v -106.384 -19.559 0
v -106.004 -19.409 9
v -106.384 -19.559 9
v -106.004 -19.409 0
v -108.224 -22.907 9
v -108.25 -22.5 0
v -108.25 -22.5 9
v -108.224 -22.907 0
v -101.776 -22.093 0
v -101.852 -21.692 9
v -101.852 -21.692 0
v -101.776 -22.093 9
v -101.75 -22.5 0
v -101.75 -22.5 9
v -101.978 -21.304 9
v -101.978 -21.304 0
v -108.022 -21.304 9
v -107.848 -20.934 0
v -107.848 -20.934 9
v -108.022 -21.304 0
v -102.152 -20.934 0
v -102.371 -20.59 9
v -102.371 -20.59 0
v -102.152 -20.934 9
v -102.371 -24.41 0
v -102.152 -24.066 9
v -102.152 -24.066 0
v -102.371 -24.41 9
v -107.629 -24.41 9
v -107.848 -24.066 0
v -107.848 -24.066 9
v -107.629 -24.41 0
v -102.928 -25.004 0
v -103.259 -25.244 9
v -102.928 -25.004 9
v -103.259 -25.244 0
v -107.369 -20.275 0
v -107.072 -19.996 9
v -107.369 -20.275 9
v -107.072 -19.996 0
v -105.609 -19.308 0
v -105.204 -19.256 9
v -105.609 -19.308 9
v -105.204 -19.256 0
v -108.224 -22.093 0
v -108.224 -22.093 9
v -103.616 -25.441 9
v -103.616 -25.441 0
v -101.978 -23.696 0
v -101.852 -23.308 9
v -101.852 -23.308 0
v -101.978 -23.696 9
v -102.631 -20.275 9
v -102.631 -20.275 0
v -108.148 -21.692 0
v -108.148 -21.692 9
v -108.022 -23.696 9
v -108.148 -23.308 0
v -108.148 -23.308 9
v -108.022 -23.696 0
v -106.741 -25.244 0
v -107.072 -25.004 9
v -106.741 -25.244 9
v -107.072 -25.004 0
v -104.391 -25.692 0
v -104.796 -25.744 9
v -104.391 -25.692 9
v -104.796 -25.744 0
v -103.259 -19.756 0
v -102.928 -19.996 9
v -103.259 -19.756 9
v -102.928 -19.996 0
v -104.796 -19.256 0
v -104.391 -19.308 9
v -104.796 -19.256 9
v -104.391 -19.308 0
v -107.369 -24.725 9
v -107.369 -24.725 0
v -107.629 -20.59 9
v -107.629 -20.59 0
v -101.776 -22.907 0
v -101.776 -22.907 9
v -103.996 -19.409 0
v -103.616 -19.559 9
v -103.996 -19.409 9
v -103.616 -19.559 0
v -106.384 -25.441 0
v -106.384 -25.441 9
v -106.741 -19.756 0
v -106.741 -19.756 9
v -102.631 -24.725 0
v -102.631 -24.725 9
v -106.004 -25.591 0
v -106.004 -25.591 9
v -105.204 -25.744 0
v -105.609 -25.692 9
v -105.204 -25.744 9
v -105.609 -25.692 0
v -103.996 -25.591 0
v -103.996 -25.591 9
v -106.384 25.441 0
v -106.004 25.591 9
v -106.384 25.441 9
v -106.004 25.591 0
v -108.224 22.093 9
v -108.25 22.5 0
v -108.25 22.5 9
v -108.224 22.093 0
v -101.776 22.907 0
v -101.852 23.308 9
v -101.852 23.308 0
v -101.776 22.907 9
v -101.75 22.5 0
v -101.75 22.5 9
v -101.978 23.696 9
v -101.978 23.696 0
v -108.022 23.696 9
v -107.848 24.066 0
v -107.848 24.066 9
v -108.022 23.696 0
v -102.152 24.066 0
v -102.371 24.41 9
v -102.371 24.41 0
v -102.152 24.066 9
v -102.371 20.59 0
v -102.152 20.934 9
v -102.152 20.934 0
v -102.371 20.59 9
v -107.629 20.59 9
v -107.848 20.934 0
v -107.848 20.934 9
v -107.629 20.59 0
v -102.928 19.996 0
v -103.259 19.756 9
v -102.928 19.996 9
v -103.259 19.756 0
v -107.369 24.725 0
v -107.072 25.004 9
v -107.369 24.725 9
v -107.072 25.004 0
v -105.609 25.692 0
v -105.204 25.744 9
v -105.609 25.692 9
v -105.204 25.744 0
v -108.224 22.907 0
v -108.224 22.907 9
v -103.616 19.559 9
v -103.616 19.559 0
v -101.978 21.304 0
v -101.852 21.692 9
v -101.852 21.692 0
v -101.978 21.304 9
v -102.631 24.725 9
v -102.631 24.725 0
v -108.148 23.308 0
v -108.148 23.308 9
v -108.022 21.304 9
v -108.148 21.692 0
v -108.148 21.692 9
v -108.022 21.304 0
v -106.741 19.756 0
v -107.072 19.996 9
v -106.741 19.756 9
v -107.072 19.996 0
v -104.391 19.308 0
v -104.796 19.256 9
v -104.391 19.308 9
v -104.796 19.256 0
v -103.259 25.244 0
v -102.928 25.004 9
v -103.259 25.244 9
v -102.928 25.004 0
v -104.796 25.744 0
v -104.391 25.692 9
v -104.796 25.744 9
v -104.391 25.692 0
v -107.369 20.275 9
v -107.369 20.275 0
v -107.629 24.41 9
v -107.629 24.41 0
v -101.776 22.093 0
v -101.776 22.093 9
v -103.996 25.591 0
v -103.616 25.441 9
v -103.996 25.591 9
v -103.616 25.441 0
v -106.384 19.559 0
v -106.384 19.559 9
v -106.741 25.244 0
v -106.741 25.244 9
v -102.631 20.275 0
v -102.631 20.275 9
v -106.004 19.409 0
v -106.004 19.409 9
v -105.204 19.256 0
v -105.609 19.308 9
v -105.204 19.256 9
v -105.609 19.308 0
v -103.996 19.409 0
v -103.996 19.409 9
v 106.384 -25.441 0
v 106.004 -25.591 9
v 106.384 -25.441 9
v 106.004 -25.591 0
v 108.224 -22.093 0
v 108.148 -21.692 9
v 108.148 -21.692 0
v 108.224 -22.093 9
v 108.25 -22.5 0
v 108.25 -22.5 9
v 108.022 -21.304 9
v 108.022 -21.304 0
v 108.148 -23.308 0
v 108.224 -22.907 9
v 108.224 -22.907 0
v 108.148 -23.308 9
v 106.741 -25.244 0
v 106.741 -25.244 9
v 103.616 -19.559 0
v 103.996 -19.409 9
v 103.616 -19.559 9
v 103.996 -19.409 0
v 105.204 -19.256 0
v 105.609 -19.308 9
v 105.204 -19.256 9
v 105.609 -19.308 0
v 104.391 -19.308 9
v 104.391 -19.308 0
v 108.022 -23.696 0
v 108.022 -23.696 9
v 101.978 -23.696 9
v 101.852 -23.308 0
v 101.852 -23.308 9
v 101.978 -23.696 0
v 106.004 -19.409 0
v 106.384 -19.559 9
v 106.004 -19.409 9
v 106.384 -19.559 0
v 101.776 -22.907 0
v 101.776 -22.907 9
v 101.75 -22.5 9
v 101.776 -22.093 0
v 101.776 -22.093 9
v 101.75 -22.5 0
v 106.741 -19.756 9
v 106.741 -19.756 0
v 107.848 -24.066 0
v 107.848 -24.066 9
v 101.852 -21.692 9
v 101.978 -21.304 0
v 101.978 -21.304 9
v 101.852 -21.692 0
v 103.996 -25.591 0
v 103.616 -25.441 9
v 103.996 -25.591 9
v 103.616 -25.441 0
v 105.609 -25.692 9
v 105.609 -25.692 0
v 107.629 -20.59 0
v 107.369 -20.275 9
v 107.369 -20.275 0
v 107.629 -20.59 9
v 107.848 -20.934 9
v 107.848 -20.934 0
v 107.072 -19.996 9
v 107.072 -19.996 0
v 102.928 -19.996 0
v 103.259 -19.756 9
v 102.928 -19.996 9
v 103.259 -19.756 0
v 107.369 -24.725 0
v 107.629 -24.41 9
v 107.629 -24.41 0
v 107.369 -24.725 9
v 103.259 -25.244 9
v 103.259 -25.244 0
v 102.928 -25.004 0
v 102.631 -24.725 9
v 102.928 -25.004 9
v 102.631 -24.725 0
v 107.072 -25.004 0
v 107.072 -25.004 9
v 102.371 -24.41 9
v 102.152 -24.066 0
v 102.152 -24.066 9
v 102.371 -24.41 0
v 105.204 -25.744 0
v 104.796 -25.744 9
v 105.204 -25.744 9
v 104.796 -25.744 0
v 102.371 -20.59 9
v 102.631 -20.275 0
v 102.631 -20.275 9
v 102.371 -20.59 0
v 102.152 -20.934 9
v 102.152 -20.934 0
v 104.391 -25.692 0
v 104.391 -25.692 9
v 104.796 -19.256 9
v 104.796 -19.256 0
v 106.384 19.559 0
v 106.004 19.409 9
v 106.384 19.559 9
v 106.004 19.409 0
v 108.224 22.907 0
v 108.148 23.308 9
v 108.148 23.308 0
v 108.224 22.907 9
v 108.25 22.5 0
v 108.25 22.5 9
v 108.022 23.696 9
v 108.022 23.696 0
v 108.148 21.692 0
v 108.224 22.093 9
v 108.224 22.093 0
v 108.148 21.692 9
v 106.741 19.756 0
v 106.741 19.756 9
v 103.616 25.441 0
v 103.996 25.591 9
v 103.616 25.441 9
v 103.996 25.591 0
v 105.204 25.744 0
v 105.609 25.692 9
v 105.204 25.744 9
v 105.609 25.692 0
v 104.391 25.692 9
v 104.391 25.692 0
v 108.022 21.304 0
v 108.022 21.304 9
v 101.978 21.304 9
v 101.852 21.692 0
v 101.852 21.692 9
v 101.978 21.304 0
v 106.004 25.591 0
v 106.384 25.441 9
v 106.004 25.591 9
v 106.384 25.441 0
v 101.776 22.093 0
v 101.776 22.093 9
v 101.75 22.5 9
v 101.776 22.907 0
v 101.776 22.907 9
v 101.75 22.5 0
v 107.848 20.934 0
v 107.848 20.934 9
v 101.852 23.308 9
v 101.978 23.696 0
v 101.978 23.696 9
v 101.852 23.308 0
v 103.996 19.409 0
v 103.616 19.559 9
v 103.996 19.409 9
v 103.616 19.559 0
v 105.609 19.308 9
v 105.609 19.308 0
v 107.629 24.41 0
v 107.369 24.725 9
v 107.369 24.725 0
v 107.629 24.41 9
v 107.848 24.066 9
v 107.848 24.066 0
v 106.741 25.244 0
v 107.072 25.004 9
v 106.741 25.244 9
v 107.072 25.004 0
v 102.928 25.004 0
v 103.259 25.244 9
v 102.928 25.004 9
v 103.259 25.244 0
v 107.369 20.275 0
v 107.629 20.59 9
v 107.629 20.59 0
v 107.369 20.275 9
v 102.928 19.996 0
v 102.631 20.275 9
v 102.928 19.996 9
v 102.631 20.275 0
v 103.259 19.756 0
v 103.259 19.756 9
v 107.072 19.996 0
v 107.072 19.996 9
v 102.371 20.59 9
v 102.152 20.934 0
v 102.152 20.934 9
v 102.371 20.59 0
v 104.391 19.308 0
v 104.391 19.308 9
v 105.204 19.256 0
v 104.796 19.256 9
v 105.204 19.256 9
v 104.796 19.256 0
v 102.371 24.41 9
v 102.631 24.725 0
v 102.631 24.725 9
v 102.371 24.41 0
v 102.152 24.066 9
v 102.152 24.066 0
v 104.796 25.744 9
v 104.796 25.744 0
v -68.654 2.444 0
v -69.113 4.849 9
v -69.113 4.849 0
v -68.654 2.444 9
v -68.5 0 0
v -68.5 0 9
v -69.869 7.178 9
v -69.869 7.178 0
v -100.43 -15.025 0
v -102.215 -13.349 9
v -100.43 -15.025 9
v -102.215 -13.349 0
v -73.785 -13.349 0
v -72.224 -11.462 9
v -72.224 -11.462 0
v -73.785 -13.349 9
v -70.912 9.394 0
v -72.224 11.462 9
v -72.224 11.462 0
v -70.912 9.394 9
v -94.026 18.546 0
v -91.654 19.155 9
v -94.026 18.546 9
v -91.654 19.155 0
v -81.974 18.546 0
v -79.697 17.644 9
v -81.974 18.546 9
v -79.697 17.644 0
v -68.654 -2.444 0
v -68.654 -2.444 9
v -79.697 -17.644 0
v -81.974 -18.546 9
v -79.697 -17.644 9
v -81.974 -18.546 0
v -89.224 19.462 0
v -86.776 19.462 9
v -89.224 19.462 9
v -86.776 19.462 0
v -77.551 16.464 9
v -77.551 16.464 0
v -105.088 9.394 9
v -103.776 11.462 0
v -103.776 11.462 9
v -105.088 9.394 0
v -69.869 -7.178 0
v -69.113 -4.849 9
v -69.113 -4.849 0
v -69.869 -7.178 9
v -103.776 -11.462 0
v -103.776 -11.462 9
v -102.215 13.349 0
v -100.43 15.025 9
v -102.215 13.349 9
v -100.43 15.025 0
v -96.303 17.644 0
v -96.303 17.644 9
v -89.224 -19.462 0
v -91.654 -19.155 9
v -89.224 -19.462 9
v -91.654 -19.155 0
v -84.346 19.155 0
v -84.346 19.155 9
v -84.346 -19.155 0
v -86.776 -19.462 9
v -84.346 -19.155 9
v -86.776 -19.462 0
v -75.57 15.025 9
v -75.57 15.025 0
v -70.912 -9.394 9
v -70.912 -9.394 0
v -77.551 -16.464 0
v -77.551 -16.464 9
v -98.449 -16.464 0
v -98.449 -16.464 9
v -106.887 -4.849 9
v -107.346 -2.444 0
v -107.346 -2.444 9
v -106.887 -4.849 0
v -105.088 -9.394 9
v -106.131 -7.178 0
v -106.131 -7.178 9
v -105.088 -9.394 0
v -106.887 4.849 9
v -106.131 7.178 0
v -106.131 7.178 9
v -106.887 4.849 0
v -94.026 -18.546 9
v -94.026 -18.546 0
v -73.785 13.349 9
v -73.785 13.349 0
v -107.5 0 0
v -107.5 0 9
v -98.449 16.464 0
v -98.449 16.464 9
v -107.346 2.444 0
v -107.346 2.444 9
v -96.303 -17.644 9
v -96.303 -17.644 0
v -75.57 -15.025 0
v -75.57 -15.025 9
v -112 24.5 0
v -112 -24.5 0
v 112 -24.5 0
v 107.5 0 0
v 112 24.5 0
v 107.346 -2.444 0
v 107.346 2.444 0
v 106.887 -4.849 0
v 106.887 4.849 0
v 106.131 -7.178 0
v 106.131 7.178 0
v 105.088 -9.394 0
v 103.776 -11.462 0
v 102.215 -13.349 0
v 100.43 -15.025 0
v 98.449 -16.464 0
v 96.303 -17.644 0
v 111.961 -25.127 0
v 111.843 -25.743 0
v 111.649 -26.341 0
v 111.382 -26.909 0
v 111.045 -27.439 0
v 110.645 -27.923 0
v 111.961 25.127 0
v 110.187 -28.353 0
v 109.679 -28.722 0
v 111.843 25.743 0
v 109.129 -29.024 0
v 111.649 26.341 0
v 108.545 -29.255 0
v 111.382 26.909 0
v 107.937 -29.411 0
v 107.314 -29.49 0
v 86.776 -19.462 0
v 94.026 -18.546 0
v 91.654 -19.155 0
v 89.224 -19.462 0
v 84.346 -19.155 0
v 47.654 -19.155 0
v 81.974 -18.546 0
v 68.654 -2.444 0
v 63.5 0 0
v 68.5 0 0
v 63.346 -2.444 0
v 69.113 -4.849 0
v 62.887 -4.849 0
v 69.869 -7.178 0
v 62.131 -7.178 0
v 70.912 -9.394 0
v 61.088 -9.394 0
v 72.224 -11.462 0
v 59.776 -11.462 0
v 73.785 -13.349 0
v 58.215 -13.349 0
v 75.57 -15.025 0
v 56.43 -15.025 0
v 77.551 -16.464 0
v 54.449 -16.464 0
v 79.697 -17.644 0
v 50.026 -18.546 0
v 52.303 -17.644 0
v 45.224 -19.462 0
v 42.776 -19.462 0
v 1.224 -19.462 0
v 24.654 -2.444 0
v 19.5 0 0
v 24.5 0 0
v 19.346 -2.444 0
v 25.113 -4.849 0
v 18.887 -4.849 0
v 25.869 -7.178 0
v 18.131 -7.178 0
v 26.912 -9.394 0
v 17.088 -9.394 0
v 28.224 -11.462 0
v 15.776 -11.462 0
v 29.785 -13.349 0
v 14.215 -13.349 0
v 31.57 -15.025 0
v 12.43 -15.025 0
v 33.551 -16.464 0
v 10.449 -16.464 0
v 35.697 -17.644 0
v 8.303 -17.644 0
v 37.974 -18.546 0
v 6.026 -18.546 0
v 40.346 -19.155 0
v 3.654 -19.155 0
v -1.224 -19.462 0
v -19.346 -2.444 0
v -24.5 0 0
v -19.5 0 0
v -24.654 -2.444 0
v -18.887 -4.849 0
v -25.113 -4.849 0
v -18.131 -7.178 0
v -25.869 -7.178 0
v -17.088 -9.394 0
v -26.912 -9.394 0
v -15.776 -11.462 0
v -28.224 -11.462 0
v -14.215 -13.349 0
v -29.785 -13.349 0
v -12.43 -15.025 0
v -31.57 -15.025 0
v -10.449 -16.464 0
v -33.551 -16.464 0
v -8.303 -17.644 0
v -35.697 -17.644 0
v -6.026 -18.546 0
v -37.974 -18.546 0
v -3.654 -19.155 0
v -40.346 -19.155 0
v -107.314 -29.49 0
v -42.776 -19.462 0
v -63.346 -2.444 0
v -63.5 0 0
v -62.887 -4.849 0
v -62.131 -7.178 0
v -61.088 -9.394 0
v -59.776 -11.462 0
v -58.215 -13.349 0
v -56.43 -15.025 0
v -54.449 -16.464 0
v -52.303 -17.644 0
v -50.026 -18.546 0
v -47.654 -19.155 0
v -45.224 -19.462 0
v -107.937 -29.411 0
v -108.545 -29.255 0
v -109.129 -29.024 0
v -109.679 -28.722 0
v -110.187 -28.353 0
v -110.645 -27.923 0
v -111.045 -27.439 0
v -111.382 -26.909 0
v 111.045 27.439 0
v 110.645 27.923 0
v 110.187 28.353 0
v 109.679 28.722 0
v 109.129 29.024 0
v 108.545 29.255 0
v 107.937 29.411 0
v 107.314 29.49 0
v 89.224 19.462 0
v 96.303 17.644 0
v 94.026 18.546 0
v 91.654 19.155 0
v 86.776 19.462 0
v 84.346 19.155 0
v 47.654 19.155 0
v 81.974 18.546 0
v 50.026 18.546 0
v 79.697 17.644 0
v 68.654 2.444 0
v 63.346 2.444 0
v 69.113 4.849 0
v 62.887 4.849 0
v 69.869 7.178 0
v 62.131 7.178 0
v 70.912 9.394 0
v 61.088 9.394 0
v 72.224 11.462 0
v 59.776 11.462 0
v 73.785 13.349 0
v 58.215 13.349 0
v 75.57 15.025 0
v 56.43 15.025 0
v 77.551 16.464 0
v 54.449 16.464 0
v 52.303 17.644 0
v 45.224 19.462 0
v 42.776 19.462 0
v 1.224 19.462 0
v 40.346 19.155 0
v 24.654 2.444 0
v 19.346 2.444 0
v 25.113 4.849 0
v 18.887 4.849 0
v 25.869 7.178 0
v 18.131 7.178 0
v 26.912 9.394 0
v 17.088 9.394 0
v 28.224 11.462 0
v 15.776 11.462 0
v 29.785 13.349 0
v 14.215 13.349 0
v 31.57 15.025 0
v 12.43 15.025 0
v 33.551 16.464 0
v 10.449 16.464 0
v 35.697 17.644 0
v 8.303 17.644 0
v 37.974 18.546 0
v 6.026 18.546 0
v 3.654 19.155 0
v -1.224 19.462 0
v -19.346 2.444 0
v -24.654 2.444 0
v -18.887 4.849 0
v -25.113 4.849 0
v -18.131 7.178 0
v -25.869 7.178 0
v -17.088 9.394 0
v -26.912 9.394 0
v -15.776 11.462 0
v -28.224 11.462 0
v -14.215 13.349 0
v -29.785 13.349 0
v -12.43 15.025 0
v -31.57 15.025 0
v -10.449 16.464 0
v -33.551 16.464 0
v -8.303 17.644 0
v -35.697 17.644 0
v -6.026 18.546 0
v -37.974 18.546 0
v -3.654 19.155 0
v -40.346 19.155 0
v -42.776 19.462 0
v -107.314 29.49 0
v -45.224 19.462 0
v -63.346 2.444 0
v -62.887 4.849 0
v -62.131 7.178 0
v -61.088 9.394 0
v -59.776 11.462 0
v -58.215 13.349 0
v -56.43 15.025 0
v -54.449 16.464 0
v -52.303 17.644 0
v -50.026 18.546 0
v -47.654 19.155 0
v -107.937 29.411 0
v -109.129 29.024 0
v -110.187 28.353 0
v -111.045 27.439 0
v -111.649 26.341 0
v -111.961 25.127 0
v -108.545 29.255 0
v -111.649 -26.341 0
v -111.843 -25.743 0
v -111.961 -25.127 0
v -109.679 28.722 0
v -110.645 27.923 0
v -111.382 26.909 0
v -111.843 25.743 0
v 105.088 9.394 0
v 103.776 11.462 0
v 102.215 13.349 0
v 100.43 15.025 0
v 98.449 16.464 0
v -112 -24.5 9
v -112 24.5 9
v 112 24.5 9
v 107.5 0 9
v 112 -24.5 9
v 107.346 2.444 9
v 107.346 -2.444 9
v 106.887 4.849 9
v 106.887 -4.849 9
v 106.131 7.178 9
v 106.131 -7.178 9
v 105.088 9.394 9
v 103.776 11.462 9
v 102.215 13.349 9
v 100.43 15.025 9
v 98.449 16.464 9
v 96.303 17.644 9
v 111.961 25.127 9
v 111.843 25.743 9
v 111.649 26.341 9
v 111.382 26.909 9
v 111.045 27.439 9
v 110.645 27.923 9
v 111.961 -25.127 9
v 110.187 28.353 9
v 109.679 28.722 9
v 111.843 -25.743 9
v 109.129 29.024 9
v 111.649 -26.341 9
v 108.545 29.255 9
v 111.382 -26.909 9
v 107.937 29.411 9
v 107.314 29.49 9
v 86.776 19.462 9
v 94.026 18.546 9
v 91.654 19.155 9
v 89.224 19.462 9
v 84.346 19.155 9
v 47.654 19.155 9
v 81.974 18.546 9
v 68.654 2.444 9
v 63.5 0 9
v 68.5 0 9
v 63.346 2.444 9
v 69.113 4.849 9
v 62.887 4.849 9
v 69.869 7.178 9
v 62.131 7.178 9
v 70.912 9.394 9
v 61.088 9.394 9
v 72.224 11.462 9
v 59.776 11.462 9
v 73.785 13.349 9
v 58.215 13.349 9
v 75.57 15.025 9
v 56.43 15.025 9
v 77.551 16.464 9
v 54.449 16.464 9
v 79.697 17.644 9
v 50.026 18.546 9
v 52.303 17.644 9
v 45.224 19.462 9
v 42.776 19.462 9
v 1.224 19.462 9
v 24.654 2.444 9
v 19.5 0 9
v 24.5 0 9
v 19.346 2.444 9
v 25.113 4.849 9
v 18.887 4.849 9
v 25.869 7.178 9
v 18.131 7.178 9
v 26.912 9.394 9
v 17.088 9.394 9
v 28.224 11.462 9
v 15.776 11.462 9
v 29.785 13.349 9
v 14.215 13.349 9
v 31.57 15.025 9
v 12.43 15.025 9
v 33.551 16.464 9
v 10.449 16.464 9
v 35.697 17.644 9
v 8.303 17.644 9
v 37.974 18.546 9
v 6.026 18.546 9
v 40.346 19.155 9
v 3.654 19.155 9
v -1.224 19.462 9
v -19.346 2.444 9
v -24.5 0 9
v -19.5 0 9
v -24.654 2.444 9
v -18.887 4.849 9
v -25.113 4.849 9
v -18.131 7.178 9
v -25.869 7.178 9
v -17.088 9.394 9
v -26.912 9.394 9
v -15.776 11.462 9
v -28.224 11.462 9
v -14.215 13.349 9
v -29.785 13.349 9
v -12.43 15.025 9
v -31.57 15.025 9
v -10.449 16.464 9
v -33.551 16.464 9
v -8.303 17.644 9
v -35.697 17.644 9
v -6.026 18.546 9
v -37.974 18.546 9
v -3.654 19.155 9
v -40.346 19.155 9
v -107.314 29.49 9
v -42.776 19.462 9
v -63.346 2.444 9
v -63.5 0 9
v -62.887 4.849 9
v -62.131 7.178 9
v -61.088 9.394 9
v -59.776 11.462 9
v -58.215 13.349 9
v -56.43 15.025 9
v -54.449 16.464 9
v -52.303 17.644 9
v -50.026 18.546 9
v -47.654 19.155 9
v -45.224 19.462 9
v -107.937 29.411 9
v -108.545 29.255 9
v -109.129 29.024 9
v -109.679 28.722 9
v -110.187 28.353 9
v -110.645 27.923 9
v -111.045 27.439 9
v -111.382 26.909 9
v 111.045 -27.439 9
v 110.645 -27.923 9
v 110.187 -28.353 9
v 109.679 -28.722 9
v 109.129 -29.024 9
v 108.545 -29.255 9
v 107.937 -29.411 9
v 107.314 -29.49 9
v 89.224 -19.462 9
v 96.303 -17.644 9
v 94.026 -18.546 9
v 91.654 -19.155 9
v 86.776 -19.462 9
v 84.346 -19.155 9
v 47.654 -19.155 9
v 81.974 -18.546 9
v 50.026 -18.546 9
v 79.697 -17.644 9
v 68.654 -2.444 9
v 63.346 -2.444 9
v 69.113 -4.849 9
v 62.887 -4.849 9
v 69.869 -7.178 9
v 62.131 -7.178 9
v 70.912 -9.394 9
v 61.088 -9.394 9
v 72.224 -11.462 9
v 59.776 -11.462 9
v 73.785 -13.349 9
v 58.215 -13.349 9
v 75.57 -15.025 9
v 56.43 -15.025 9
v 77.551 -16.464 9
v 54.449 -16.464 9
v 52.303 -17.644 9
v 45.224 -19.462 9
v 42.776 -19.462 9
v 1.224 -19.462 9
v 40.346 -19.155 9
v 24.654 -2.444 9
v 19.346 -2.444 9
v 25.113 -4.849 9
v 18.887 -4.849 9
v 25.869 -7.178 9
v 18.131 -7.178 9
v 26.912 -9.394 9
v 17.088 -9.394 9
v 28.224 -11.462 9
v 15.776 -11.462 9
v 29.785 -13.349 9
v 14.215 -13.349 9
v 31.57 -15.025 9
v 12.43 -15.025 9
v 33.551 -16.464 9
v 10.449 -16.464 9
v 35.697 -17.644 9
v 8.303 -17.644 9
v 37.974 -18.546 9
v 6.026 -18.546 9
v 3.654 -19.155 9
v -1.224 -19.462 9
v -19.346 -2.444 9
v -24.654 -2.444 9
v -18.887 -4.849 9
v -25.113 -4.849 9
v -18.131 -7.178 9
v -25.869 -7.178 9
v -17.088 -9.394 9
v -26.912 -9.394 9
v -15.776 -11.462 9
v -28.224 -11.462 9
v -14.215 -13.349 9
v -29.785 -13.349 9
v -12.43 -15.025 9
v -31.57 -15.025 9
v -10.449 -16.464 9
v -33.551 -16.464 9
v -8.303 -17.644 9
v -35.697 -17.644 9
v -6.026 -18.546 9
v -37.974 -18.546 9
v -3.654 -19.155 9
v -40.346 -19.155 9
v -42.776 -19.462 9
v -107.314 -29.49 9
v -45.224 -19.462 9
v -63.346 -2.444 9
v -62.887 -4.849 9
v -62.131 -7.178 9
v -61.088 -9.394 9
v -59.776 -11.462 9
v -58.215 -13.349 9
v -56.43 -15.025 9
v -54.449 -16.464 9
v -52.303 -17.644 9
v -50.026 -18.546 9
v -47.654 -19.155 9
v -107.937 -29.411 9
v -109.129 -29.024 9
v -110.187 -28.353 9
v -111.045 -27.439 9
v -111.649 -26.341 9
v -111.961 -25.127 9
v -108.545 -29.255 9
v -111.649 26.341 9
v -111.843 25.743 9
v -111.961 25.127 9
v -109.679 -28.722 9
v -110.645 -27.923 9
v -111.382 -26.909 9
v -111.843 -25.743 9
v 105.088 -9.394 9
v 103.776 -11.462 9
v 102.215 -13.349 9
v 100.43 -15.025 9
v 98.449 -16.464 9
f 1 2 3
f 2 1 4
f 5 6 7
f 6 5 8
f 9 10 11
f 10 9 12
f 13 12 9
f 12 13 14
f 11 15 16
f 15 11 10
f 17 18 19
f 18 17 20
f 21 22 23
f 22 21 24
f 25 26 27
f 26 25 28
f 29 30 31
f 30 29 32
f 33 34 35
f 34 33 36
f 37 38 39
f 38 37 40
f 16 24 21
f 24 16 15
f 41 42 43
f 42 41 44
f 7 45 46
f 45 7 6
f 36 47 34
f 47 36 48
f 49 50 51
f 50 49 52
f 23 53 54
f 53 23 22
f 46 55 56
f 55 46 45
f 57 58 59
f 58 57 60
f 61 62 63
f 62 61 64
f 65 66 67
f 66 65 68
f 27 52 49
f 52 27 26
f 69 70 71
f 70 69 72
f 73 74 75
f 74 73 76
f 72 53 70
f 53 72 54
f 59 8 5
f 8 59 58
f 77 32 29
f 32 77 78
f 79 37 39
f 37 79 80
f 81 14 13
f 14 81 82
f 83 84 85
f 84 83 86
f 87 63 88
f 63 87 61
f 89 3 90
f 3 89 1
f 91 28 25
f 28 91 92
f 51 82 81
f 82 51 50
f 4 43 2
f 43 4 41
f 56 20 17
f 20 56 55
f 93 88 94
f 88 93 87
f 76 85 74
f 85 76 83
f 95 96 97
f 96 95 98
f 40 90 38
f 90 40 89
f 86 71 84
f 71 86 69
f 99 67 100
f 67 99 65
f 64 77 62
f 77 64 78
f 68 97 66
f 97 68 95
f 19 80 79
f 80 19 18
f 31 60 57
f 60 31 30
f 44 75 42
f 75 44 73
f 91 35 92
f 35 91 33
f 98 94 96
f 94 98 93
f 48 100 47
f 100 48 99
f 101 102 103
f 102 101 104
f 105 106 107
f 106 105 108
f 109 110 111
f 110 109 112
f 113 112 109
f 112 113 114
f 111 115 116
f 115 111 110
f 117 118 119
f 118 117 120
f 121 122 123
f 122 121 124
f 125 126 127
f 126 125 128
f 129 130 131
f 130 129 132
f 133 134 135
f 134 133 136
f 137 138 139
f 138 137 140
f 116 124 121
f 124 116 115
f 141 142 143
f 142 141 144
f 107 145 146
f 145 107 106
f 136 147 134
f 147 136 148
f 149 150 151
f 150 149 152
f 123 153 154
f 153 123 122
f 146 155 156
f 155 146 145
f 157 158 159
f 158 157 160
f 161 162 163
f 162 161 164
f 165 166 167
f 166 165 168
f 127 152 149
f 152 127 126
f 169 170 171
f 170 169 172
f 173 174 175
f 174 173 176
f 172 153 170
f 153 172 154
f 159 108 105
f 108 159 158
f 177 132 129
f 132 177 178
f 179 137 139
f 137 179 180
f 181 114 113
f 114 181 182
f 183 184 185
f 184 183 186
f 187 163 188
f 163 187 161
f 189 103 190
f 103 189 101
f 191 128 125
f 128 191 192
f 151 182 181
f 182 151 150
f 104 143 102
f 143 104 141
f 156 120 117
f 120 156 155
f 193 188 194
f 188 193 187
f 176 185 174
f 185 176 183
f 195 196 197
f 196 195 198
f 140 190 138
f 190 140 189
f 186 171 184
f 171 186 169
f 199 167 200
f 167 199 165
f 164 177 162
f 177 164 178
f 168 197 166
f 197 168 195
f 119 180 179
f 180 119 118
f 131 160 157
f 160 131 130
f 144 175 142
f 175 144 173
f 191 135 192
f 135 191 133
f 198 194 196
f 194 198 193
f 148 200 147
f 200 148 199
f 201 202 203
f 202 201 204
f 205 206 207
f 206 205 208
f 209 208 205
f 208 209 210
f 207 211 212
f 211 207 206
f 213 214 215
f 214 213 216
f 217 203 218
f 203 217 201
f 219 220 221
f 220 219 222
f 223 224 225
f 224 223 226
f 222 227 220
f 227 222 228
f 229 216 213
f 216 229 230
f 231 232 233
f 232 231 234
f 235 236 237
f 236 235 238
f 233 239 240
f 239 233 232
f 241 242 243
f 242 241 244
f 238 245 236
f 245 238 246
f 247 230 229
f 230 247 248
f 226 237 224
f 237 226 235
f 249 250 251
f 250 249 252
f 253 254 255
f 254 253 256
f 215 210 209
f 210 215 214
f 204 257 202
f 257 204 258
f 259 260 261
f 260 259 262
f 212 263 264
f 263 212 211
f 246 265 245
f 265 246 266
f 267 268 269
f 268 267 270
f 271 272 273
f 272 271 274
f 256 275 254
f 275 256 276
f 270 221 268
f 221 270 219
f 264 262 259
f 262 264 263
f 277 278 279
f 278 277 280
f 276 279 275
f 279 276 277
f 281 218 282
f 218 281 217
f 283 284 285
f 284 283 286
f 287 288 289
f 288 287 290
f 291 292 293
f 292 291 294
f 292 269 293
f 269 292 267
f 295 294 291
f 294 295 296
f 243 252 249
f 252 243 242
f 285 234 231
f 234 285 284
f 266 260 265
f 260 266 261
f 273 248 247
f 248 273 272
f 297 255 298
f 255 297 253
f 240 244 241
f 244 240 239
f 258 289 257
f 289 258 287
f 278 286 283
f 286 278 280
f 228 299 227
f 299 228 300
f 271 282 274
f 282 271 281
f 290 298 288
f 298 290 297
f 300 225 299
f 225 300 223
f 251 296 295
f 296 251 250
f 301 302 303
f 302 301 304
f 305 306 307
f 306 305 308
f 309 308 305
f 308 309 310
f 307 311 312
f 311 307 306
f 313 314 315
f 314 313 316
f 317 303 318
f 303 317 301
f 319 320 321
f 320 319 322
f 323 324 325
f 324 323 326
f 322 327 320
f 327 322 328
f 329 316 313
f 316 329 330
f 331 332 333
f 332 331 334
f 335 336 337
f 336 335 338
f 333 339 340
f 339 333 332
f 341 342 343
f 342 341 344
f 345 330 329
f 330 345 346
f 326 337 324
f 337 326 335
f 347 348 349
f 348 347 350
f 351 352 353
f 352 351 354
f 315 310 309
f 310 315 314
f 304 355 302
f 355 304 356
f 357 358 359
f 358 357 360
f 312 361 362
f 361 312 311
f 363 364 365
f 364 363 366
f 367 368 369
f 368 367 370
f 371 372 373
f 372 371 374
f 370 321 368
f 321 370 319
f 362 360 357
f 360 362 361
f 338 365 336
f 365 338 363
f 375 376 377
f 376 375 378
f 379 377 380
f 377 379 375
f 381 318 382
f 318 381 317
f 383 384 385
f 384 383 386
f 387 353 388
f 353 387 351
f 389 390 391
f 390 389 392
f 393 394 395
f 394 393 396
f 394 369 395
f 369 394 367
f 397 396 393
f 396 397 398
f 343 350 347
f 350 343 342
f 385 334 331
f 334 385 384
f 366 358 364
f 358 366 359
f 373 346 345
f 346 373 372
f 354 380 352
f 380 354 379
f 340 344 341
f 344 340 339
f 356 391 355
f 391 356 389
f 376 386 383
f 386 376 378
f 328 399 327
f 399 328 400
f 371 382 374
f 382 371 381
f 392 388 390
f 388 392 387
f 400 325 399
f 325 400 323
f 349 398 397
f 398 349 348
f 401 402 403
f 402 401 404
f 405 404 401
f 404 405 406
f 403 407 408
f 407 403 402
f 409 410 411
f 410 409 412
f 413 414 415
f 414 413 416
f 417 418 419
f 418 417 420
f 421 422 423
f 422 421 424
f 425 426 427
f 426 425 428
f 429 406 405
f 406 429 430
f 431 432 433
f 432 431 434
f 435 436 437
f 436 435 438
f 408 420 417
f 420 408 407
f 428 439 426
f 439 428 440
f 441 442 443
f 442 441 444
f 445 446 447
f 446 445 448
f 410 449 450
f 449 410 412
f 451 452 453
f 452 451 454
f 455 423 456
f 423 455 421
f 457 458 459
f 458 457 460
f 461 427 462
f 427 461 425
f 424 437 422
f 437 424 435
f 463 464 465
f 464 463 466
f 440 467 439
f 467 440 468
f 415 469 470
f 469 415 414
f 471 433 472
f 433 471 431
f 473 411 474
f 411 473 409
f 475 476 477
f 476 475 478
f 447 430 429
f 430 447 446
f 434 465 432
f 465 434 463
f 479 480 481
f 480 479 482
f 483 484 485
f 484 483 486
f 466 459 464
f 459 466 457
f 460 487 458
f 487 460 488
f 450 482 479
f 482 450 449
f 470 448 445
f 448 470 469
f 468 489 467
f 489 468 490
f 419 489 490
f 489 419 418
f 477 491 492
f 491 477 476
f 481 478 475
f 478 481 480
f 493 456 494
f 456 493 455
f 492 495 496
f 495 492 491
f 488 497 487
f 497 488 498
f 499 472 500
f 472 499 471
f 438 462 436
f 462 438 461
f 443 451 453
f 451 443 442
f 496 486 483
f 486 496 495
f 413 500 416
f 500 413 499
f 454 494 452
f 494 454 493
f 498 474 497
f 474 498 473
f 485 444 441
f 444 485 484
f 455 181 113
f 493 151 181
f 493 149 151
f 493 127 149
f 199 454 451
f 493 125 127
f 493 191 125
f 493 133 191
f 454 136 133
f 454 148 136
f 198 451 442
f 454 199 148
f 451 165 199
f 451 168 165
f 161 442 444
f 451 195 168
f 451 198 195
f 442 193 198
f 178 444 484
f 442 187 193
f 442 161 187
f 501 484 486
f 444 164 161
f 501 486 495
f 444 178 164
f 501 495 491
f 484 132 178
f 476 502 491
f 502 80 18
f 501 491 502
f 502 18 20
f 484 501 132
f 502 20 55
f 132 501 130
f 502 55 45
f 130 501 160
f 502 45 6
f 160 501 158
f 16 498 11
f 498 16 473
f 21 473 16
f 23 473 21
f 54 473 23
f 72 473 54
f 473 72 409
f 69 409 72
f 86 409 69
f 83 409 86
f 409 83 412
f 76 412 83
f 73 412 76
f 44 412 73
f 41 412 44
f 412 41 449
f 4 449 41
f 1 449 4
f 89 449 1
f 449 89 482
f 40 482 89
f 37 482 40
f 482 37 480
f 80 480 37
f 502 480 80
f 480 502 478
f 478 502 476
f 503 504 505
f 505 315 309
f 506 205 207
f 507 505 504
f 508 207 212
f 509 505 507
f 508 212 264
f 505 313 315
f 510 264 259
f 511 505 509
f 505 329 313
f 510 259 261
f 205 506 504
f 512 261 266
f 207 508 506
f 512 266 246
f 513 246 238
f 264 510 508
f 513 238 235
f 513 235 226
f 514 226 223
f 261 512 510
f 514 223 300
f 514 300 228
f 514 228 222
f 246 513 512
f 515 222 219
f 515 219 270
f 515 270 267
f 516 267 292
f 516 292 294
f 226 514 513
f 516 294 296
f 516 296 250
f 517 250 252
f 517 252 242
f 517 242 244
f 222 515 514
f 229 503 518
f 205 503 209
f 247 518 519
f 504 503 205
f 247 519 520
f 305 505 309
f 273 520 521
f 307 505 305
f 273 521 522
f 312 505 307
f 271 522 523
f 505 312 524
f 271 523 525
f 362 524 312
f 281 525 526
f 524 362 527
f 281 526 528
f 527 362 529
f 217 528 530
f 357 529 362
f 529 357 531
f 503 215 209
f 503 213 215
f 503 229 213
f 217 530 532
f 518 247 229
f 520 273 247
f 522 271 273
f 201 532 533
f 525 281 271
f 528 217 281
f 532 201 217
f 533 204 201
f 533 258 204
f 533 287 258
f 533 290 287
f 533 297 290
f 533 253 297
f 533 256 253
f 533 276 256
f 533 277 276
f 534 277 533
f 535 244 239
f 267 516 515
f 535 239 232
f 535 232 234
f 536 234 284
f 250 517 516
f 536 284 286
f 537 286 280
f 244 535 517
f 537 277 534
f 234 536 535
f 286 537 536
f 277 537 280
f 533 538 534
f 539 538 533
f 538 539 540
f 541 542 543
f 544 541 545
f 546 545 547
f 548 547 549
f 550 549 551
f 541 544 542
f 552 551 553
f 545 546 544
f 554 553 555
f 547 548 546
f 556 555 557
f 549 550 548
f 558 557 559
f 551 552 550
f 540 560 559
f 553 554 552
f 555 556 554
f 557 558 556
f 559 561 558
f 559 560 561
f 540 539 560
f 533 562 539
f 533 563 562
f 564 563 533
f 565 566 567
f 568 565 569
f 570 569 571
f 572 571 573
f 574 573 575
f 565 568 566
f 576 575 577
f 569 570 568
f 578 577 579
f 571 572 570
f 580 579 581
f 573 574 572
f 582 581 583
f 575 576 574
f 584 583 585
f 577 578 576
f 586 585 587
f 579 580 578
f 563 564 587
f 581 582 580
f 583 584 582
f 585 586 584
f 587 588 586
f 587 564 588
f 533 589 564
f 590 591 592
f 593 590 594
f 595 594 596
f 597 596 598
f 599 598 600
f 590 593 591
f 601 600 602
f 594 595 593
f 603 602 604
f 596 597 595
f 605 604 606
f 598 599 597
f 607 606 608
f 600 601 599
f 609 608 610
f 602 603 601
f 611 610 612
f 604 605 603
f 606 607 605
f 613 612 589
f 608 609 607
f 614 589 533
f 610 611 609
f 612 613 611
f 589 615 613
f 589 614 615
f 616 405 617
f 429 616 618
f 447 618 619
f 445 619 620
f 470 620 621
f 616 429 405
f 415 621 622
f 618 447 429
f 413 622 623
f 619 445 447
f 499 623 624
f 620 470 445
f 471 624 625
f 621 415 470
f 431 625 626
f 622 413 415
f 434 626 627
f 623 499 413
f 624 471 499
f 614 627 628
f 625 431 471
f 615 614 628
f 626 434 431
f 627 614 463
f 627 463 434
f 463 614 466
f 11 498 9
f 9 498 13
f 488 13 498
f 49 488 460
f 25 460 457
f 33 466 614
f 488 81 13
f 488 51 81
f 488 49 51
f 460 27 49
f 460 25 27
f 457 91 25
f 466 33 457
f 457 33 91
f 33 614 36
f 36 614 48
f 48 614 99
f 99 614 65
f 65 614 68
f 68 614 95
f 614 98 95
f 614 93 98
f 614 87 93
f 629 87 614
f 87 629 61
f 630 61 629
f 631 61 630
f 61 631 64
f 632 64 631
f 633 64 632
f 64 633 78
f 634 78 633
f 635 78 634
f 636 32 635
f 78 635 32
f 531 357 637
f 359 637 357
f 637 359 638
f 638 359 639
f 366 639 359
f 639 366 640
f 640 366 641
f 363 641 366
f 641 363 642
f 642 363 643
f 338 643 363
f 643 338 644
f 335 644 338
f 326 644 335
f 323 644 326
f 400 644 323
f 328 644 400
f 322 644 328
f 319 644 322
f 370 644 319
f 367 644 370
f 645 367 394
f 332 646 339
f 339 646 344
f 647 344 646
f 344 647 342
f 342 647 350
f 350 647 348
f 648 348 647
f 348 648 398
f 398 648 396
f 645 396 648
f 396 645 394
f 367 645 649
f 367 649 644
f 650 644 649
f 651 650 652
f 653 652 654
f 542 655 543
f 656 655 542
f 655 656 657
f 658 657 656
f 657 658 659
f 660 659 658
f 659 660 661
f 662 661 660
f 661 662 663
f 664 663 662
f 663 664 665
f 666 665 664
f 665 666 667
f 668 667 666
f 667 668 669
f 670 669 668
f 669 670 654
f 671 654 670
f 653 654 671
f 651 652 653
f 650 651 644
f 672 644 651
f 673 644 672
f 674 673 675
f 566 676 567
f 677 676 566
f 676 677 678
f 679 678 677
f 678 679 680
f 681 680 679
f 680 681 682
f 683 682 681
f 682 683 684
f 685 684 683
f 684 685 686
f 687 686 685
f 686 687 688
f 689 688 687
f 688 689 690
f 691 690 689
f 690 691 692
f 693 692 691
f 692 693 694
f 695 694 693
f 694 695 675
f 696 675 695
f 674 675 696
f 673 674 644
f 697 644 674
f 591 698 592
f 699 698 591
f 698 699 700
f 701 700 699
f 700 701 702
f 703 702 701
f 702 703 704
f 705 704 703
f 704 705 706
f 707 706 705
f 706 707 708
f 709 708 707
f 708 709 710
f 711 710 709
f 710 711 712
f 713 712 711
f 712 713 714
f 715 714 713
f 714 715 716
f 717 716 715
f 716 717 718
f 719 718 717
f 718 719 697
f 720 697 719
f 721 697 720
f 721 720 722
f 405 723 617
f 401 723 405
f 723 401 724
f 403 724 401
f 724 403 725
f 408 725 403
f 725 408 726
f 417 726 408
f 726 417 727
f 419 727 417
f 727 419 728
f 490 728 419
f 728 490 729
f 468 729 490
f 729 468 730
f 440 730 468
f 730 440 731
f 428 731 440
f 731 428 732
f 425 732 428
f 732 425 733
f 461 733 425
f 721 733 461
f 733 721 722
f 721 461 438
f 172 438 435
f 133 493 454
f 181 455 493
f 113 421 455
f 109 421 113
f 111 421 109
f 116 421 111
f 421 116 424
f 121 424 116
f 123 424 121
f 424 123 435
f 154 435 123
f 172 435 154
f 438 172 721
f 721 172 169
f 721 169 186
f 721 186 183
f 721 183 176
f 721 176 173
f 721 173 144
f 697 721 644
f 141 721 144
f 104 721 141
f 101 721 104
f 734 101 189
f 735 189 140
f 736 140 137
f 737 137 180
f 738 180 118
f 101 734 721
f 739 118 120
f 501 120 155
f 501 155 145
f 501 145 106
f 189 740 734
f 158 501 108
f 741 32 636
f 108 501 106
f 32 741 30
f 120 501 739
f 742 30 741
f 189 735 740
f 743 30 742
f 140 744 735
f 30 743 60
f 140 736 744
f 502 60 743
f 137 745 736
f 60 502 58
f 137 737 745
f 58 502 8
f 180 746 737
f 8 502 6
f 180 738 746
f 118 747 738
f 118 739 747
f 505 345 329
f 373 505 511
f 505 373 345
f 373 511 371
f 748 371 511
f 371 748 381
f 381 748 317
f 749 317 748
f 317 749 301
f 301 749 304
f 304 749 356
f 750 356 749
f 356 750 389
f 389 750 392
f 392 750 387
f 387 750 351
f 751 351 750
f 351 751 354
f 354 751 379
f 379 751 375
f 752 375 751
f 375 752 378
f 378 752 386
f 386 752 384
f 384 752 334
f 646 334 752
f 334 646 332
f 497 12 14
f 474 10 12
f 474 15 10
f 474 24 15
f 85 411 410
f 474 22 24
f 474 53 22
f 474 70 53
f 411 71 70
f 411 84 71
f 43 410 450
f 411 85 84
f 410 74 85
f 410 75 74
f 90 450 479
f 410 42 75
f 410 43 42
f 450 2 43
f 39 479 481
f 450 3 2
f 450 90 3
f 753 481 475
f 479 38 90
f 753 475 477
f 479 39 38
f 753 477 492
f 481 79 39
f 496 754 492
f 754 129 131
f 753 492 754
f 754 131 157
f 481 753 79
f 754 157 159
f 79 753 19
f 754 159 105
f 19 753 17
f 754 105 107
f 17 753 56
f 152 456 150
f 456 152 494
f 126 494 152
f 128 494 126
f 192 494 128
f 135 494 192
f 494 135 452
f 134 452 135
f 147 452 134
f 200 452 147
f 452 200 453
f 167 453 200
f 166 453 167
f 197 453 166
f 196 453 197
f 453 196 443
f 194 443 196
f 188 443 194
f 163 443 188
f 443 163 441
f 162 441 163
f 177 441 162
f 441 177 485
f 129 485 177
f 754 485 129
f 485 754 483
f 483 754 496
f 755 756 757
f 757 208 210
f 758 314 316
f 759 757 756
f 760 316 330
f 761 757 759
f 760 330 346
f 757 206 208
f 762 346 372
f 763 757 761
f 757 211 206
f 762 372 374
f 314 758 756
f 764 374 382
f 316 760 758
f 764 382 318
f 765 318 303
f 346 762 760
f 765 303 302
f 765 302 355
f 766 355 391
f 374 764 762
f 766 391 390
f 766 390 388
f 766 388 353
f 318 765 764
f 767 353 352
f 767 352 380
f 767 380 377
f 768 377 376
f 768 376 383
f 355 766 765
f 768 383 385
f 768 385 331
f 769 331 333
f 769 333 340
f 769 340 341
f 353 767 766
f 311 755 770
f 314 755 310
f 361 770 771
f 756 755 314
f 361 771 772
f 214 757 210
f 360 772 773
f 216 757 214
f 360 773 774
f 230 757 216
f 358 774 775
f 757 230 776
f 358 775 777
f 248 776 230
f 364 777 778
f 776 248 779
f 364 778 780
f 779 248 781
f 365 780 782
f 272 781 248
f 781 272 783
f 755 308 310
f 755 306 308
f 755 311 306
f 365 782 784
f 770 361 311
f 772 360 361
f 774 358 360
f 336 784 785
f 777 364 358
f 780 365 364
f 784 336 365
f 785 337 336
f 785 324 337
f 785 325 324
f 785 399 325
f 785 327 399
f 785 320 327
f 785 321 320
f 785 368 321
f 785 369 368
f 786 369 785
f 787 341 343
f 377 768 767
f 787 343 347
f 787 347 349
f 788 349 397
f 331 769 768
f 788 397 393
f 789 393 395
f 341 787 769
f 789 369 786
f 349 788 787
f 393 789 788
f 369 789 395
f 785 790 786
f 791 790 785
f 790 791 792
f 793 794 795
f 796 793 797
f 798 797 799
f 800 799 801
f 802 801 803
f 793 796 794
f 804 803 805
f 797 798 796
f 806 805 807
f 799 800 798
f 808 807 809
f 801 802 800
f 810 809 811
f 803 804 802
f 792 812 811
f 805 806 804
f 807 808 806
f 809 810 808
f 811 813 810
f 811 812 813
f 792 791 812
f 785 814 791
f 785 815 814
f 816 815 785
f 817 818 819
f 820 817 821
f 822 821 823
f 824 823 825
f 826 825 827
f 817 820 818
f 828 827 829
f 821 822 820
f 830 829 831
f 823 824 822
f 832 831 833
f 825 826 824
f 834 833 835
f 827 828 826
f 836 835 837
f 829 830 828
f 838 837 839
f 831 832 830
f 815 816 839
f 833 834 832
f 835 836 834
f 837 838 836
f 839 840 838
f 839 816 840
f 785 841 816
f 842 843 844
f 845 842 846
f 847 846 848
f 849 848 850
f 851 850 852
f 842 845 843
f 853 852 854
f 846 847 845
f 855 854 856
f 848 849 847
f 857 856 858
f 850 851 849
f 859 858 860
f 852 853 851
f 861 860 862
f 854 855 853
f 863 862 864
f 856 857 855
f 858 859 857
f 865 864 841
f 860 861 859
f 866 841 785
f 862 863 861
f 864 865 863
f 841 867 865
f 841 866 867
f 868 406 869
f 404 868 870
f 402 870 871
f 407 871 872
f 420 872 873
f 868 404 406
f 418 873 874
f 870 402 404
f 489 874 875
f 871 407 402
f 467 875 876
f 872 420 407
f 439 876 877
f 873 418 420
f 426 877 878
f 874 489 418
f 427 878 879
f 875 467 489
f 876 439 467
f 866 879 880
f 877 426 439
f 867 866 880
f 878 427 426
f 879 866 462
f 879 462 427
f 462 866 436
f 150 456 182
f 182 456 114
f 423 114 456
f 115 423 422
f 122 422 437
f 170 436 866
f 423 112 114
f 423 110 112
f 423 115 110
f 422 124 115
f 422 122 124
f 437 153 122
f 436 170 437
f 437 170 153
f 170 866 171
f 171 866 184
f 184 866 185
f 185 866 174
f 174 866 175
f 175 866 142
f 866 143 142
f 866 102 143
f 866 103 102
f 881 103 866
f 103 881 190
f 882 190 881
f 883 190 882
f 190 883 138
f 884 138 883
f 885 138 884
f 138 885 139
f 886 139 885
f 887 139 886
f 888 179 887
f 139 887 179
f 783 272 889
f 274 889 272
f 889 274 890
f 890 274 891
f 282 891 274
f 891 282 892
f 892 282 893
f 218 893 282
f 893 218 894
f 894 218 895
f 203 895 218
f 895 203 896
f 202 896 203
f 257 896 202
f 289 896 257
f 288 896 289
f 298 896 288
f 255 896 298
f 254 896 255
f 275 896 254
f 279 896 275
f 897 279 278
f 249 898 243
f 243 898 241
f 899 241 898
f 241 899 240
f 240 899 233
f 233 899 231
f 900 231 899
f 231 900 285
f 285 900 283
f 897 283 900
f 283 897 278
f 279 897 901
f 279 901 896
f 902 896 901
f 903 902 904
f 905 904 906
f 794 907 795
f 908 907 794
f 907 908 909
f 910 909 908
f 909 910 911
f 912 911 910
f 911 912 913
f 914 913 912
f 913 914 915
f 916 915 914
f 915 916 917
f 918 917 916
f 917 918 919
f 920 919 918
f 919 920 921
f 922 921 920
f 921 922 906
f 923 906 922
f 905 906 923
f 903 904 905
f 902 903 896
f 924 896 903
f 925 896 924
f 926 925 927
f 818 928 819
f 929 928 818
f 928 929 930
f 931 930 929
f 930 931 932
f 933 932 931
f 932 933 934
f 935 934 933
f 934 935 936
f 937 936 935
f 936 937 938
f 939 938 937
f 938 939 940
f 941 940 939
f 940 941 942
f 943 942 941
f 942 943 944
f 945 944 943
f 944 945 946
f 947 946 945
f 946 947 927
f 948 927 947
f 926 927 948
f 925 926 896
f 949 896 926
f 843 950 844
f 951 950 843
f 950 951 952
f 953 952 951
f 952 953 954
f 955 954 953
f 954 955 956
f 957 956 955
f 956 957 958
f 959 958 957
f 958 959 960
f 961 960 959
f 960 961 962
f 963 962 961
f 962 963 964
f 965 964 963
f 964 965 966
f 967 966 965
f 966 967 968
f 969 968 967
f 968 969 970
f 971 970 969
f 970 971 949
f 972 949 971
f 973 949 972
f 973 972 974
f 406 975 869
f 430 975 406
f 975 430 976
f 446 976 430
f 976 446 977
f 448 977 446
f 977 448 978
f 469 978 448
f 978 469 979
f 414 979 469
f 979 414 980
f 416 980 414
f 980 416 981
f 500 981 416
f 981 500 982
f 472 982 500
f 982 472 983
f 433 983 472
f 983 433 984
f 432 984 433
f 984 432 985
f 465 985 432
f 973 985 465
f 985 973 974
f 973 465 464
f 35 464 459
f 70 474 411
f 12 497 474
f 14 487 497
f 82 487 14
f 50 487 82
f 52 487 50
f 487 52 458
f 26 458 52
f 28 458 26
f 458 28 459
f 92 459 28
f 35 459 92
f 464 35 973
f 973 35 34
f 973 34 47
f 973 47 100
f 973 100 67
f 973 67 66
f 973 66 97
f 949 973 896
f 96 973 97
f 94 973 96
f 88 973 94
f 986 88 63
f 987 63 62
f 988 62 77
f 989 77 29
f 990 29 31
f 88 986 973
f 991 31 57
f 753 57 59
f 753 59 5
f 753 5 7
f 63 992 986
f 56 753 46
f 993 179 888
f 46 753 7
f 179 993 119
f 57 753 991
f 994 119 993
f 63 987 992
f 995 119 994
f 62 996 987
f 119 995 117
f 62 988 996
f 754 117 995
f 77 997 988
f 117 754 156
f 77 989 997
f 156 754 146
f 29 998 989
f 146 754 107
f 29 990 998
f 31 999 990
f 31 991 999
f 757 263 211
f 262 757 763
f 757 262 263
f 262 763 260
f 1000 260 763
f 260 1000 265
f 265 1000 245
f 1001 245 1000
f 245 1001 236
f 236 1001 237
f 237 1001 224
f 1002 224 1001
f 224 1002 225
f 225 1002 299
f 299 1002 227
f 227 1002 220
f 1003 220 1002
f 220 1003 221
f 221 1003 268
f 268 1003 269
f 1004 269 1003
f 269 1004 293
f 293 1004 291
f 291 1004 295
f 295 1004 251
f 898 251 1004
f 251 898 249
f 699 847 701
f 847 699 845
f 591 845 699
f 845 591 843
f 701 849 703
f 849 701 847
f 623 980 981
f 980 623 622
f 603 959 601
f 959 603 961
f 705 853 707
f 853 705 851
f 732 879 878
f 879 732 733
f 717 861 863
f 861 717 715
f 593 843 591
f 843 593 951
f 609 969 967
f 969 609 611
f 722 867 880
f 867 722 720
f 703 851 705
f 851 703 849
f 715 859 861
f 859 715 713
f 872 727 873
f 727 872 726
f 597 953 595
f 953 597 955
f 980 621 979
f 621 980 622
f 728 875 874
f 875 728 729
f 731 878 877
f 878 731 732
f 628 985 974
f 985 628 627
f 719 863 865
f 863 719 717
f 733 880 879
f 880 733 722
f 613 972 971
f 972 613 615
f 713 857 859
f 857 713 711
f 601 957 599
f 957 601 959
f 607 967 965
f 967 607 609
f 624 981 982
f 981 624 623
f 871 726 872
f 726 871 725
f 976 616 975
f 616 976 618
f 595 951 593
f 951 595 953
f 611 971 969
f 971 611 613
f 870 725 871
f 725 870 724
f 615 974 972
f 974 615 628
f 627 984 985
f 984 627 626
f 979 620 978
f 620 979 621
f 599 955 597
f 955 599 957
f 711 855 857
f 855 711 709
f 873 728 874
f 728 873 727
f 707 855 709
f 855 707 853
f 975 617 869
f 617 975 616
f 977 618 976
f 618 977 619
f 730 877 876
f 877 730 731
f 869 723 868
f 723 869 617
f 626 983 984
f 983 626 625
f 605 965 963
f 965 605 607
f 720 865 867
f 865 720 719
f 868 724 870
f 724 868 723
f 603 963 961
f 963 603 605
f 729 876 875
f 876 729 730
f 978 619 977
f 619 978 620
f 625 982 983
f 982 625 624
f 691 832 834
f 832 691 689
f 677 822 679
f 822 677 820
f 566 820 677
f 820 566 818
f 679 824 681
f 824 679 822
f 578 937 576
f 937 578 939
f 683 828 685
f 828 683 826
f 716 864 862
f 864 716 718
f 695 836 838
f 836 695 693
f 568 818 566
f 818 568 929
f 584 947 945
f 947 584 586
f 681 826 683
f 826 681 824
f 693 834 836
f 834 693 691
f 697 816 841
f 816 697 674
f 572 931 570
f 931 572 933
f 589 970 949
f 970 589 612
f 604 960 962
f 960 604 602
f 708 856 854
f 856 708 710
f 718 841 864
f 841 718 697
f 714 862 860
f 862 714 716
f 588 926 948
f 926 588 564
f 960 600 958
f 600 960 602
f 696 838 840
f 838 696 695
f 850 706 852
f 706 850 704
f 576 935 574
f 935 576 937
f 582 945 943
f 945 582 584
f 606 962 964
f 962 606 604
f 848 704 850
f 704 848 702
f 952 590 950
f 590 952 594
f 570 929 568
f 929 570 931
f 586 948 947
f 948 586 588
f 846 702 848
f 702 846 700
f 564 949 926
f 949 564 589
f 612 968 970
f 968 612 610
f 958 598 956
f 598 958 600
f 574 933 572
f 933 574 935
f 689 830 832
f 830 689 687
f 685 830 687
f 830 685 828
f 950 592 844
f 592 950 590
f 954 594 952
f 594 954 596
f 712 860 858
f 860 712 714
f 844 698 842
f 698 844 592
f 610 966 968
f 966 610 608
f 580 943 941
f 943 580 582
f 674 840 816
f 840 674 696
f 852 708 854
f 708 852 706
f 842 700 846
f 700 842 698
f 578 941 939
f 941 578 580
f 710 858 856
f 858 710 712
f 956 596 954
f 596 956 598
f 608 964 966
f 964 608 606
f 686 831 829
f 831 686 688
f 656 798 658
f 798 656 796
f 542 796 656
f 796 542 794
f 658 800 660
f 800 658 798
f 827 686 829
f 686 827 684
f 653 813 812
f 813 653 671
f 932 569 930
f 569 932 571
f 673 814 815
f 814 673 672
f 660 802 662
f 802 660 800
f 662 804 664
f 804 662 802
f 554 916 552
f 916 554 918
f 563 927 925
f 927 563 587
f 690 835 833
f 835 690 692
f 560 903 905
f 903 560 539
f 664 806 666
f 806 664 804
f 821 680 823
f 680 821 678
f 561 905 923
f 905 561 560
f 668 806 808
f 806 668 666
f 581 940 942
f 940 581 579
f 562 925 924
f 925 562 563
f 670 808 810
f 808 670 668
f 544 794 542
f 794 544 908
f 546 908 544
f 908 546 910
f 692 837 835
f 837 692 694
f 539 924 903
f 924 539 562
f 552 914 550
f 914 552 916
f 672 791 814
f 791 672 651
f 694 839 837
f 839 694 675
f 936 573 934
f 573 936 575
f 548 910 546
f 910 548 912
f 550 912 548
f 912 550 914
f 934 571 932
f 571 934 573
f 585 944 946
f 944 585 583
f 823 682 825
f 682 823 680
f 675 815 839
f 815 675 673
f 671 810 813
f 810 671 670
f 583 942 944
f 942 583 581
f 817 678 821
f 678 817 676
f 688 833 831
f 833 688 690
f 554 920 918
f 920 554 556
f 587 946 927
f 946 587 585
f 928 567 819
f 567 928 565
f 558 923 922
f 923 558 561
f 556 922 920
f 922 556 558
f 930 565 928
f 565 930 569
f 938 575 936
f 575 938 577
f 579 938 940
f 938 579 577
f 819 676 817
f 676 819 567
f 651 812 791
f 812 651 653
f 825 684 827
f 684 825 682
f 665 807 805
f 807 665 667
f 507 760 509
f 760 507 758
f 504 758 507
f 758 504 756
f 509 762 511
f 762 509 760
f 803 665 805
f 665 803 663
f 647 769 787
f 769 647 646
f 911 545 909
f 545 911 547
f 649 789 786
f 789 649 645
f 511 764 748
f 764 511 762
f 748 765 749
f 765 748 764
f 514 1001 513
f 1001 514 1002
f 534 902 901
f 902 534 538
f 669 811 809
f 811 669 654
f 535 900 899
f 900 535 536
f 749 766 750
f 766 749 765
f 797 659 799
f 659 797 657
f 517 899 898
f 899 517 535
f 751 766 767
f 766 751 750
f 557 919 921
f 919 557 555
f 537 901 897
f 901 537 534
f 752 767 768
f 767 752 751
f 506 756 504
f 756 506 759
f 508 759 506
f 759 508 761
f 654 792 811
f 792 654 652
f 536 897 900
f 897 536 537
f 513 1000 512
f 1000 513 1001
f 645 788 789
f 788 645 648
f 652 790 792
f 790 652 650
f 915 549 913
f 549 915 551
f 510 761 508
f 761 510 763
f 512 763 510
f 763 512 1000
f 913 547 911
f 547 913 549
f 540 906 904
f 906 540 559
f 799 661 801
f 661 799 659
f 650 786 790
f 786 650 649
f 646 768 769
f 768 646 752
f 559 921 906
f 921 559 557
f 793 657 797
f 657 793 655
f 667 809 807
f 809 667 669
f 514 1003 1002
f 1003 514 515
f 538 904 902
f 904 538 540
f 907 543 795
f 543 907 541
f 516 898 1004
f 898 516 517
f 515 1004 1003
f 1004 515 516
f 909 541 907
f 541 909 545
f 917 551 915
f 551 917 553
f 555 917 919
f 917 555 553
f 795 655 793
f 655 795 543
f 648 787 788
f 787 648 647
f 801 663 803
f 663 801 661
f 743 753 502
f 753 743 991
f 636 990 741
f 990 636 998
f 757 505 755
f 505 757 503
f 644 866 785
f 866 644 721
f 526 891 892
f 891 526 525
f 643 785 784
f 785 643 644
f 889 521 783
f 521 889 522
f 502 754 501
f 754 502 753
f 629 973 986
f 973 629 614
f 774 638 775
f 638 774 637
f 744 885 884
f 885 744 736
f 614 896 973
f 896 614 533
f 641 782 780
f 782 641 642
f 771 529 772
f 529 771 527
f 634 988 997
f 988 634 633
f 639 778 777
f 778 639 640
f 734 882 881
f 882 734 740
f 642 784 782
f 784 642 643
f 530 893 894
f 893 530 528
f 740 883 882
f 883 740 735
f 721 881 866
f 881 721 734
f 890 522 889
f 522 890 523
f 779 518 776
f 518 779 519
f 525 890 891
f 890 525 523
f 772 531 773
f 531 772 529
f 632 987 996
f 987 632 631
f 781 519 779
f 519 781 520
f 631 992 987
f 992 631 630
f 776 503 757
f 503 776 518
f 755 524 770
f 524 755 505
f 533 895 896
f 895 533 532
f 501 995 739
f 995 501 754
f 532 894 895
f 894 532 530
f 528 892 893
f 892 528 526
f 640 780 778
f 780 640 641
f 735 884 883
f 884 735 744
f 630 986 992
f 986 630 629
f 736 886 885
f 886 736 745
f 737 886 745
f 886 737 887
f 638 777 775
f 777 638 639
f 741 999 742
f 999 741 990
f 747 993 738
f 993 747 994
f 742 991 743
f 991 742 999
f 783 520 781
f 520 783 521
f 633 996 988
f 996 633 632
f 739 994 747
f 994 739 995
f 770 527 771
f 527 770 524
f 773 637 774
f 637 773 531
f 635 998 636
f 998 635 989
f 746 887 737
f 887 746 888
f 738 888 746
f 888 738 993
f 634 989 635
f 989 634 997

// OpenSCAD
$fn = 50;

difference() {
	union() {
		hull() {
			translate(v = [-107.0, 24.5, 0]) {
				cylinder(h = 9, r = 5);
			}
			translate(v = [107.0, 24.5, 0]) {
				cylinder(h = 9, r = 5);
			}
			translate(v = [-107.0, -24.5, 0]) {
				cylinder(h = 9, r = 5);
			}
			translate(v = [107.0, -24.5, 0]) {
				cylinder(h = 9, r = 5);
			}
		}
	}
	union() {
		translate(v = [-105.0, -22.5, -100.0]) {
			cylinder(h = 200, r = 3.25);
		}
		translate(v = [-105.0, 22.5, -100.0]) {
			cylinder(h = 200, r = 3.25);
		}
		translate(v = [105.0, -22.5, -100.0]) {
			cylinder(h = 200, r = 3.25);
		}
		translate(v = [105.0, 22.5, -100.0]) {
			cylinder(h = 200, r = 3.25);
		}
		translate(v = [-105.0, -22.5, -100.0]) {
			cylinder(h = 200, r = 1.8);
		}
		translate(v = [-105.0, 22.5, -100.0]) {
			cylinder(h = 200, r = 1.8);
		}
		translate(v = [105.0, -22.5, -100.0]) {
			cylinder(h = 200, r = 1.8);
		}
		translate(v = [105.0, 22.5, -100.0]) {
			cylinder(h = 200, r = 1.8);
		}
		translate(v = [-88.0, 0, 0.0]) {
			cylinder(h = 9, r = 19.5);
		}
		translate(v = [-44.0, 0, 0.0]) {
			cylinder(h = 9, r = 19.5);
		}
		cylinder(h = 9, r = 19.5);
		translate(v = [44.0, 0, 0.0]) {
			cylinder(h = 9, r = 19.5);
		}
		translate(v = [88.0, 0, 0.0]) {
			cylinder(h = 9, r = 19.5);
		}
	}
}
